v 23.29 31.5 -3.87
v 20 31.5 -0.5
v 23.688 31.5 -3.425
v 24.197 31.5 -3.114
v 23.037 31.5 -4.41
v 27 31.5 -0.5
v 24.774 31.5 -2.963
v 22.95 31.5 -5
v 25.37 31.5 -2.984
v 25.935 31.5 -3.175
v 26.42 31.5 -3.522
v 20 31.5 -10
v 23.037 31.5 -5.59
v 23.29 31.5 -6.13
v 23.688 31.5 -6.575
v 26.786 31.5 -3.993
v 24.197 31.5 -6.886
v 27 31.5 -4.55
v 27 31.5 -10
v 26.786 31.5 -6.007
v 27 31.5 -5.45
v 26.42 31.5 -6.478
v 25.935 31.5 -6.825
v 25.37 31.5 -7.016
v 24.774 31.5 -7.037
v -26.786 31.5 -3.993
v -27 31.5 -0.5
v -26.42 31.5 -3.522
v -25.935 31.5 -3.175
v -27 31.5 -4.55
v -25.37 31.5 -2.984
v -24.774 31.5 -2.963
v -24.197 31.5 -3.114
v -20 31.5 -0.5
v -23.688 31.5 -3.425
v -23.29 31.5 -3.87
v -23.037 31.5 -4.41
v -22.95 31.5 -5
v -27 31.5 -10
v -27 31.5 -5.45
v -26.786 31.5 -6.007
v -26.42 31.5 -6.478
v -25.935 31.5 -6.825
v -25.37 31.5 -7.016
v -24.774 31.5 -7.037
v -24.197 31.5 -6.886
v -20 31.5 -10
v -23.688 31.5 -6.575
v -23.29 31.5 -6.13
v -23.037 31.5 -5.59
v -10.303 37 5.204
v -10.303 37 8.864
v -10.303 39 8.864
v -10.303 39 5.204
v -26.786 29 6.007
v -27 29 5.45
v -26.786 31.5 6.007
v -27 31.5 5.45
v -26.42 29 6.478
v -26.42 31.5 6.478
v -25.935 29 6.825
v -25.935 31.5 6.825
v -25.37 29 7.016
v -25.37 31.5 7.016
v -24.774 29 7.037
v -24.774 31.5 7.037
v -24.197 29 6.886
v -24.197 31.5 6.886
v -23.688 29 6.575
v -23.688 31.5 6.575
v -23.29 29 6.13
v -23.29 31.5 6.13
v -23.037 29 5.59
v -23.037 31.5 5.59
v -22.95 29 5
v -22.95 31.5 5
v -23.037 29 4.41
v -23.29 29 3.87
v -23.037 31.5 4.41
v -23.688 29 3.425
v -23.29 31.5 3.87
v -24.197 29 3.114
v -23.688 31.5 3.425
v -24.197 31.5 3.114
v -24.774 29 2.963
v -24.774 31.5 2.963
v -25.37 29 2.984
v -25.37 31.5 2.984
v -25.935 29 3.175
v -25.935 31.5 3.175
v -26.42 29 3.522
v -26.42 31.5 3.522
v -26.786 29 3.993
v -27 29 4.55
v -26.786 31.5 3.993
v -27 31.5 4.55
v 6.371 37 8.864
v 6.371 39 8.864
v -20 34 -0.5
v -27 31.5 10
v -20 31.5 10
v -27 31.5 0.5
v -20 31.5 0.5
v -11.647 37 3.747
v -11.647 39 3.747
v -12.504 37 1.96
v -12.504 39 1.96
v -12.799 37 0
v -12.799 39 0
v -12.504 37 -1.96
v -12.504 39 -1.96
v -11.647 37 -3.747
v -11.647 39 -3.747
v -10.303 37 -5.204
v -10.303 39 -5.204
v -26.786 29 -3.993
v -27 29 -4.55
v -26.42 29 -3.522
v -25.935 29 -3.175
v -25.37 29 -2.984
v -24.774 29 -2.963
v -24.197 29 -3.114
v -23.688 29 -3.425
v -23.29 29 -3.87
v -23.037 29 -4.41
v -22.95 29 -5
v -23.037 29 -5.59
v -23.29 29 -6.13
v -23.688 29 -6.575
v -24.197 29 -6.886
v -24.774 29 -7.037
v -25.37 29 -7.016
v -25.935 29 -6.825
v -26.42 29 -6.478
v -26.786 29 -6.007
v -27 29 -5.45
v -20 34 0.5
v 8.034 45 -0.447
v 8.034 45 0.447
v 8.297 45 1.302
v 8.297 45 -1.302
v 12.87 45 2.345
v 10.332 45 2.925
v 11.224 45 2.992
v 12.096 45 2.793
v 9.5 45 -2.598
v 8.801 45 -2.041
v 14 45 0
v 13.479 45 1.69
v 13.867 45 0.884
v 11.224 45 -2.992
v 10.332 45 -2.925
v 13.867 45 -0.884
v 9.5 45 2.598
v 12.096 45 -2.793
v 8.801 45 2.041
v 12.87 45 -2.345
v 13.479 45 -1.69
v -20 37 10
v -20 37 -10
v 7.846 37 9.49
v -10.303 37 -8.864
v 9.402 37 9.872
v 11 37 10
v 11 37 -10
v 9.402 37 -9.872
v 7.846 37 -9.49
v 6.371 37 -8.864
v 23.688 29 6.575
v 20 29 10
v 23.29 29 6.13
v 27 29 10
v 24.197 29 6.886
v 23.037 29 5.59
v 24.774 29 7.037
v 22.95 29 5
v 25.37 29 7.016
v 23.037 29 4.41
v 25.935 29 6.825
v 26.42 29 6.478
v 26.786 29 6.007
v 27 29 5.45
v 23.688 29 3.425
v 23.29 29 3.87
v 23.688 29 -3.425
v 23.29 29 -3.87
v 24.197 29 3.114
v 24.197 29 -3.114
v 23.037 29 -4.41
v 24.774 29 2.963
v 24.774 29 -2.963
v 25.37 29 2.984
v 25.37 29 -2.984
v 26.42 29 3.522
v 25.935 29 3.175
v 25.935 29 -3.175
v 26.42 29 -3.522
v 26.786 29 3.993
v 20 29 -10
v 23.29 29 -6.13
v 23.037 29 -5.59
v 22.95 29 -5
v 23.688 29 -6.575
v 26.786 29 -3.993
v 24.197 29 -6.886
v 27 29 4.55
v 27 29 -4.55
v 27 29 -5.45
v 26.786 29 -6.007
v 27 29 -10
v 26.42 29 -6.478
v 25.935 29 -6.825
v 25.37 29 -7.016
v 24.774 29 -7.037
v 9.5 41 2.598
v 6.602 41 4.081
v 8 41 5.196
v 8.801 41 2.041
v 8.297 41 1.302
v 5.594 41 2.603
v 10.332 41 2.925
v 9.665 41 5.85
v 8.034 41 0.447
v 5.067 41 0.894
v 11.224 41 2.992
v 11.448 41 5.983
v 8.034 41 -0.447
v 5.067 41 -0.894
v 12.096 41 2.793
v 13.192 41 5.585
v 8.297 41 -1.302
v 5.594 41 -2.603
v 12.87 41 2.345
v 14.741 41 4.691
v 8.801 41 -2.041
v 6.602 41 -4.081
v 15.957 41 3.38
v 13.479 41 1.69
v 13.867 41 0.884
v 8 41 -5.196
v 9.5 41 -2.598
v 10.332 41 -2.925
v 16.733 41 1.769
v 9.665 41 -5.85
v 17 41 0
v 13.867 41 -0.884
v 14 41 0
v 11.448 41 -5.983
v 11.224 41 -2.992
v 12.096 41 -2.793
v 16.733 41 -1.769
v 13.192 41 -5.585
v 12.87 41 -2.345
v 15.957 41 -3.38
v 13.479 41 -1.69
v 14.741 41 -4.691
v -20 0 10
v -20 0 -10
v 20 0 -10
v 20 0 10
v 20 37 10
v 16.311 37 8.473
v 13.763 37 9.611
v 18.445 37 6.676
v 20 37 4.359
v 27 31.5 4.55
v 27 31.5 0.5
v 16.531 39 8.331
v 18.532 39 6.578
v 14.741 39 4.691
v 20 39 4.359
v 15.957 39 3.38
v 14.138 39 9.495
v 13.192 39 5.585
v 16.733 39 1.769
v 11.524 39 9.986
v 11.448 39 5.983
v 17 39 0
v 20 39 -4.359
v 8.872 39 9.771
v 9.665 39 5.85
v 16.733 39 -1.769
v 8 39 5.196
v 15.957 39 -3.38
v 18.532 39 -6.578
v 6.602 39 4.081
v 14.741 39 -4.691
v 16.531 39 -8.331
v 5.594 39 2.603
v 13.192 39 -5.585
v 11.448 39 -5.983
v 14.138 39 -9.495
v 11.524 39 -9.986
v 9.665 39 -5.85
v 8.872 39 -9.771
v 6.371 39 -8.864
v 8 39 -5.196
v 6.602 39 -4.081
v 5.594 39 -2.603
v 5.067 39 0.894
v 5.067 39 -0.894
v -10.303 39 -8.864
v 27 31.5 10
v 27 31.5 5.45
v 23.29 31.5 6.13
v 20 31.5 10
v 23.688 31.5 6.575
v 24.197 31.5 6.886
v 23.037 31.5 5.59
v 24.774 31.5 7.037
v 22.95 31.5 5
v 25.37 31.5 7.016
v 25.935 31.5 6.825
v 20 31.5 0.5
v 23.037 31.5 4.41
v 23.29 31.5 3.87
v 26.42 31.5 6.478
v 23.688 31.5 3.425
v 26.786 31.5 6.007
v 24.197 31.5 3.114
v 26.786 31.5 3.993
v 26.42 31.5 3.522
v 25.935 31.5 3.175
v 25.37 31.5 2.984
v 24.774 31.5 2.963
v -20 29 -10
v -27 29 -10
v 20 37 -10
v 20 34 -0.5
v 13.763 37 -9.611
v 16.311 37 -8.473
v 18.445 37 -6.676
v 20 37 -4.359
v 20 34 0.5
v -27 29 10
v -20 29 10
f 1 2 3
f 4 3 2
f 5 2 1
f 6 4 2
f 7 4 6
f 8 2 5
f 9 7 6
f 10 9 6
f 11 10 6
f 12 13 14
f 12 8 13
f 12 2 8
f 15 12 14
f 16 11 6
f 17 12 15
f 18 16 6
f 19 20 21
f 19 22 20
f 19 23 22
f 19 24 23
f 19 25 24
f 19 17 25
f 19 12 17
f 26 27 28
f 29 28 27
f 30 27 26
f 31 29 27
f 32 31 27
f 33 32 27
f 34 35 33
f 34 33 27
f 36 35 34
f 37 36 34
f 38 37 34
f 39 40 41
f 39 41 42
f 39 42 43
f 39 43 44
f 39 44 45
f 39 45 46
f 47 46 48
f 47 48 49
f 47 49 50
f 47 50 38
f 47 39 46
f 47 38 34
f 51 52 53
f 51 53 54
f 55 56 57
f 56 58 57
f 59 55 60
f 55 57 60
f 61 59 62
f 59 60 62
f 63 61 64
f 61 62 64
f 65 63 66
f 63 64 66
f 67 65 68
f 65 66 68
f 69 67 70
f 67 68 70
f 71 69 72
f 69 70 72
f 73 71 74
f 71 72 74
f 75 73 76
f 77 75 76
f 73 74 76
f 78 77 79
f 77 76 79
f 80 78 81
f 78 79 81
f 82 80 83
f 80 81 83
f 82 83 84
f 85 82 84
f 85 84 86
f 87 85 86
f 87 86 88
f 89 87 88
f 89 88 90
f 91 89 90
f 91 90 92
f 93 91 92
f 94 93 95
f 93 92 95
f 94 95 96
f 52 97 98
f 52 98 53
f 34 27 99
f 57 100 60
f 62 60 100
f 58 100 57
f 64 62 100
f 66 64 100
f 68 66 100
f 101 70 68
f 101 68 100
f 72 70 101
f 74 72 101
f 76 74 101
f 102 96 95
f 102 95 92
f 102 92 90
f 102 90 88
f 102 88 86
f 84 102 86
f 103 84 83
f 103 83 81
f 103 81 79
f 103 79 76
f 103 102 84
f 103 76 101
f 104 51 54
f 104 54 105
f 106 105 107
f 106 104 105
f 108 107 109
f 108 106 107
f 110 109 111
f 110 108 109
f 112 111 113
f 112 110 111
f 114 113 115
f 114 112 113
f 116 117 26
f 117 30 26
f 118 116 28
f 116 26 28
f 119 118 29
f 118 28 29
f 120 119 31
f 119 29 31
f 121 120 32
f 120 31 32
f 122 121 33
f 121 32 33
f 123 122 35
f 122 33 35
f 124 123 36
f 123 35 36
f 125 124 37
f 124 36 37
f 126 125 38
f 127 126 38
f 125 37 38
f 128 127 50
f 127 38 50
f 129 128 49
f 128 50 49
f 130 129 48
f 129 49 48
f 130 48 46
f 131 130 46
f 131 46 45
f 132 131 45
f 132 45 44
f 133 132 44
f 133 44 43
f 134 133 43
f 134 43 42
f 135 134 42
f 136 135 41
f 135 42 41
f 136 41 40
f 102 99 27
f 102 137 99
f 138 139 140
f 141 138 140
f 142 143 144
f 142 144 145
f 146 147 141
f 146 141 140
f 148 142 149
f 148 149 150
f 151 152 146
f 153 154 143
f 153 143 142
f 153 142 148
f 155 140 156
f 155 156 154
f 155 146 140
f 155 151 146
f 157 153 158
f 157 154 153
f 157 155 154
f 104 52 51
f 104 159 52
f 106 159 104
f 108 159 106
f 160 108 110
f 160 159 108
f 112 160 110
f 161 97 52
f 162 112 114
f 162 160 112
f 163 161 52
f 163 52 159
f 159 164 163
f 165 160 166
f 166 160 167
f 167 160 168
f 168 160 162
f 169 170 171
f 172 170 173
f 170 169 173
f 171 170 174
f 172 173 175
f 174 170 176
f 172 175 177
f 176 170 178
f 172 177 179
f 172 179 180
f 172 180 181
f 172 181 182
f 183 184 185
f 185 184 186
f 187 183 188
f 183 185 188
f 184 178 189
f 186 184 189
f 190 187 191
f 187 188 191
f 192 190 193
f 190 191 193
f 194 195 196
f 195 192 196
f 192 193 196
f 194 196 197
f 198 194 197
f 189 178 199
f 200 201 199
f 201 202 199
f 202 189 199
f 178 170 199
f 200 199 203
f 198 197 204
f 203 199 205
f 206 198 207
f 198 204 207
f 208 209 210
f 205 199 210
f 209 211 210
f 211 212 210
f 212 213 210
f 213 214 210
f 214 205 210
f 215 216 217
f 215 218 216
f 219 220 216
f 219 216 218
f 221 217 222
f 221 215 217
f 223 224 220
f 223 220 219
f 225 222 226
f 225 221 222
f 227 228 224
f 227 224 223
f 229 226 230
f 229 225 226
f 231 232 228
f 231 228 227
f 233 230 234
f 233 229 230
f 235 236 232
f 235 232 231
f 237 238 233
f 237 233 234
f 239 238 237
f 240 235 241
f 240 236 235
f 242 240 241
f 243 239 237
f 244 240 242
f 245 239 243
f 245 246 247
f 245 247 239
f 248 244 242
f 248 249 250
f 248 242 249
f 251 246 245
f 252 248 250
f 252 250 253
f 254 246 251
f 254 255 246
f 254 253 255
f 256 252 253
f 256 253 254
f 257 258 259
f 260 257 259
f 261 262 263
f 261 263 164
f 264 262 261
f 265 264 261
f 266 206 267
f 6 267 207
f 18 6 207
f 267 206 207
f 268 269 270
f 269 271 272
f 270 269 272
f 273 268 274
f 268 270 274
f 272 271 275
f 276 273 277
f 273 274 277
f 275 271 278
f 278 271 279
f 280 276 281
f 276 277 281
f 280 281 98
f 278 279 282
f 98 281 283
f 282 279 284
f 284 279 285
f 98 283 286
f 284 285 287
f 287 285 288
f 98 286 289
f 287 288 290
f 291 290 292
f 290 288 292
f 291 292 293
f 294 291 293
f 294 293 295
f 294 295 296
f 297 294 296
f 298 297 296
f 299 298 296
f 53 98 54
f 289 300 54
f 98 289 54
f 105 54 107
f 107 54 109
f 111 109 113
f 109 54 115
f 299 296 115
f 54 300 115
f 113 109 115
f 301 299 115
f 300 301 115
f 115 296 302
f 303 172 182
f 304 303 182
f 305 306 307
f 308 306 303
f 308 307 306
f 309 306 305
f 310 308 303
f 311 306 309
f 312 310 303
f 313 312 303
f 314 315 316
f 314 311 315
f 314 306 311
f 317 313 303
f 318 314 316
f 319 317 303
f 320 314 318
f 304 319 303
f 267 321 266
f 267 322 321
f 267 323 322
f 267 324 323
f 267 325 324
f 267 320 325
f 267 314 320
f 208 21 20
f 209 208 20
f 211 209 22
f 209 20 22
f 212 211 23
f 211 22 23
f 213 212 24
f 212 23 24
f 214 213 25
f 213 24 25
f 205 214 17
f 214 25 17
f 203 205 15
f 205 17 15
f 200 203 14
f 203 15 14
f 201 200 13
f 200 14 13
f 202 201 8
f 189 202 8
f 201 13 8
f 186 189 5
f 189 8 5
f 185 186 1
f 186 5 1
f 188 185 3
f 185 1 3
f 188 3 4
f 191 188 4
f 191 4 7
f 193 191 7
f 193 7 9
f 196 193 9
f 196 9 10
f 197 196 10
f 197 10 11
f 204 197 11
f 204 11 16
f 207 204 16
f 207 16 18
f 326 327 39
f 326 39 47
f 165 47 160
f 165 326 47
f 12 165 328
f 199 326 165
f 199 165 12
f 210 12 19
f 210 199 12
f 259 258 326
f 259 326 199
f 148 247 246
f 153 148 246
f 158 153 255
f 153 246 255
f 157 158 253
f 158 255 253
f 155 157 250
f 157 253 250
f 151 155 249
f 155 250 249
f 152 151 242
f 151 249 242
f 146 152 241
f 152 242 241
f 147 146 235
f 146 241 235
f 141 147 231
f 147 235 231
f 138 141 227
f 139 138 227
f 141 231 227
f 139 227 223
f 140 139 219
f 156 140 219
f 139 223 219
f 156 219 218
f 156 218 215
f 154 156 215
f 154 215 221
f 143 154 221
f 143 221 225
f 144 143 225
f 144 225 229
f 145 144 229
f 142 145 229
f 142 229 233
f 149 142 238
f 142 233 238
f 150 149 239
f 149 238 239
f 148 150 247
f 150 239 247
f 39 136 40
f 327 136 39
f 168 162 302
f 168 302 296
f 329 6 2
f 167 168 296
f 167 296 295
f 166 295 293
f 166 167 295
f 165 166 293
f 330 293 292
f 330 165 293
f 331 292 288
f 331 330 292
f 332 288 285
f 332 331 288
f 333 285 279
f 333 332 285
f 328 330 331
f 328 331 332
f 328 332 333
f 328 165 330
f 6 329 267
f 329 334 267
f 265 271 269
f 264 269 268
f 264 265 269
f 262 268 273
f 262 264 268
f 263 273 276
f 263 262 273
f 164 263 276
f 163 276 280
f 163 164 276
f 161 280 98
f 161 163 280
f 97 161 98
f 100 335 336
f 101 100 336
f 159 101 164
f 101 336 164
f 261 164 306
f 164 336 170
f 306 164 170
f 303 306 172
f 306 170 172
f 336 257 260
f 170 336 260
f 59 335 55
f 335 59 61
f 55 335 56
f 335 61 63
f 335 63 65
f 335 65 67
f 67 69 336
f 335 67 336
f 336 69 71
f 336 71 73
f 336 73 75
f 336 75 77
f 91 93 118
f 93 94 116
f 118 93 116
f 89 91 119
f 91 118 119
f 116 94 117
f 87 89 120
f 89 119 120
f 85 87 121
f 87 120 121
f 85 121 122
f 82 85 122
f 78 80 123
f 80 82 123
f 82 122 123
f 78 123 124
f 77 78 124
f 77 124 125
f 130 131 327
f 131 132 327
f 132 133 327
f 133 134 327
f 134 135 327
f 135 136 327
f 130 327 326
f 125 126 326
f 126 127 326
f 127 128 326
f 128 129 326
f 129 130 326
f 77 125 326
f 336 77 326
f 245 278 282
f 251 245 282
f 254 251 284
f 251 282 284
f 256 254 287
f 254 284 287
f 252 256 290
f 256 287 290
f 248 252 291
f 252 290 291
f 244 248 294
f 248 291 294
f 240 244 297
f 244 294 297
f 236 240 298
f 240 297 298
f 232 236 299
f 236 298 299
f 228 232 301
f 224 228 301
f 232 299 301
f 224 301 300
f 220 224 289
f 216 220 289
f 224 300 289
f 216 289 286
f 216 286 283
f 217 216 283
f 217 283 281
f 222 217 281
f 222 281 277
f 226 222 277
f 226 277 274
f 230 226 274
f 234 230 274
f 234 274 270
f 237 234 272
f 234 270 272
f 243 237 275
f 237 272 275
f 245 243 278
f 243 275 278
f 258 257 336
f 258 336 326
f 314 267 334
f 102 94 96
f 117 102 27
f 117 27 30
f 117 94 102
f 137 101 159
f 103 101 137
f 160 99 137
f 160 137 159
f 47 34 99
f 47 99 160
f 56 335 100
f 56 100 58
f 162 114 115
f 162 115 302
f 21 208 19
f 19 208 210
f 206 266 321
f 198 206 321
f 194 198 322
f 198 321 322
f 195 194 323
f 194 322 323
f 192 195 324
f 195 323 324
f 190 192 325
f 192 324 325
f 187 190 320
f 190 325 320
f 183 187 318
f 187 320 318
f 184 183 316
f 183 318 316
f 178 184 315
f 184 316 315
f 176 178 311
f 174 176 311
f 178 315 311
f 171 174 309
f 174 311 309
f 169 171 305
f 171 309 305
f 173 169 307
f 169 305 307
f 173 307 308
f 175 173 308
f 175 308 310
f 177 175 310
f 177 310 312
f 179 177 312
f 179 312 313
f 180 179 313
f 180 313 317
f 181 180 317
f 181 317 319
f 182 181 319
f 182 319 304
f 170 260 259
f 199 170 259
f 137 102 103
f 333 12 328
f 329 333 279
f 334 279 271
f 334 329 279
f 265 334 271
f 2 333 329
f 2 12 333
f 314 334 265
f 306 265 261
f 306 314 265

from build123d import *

# Parameters (mm, degrees)
SKETCH1_W                = 40
SKETCH1_H                = 20
BOSS_EXTRUDE1_DEPTH      = 29
SKETCH2_W                = 54
SKETCH2_H                = 20
BOSS_EXTRUDE2_DEPTH      = 2.5
SKETCH3_W                = 40
SKETCH3_H                = 20
BOSS_EXTRUDE3_DEPTH      = 5.5
BOSS_EXTRUDE4_DEPTH      = 2
SKETCH5_R                = 6
BOSS_EXTRUDE5_DEPTH      = 2
SKETCH6_R                = 3
BOSS_EXTRUDE6_DEPTH      = 4
SKETCH7_R                = 2.05
CUT_EXTRUDE2_DEPTH       = 4
BOSS_EXTRUDE8_DEPTH      = 0.5
BOSS_EXTRUDE8_DEPTH_BACK = 0.5


with BuildPart() as part:
    # Sketch1 → Boss-Extrude1 (new body)
    with BuildSketch(Plane(origin=(0, 0, 0), x_dir=(1, 0, 0), z_dir=(0, 1, 0))):
        Rectangle(SKETCH1_W, SKETCH1_H)
    extrude(amount=BOSS_EXTRUDE1_DEPTH)

    # Sketch2 → Boss-Extrude2 (add)
    with BuildSketch(Plane(origin=(0, 29, 0), x_dir=(1, 0, 0), z_dir=(0, 1, 0))):
        Rectangle(SKETCH2_W, SKETCH2_H)
    extrude(amount=BOSS_EXTRUDE2_DEPTH)

    # Sketch3 → Boss-Extrude3 (add)
    with BuildSketch(Plane(origin=(0, 31.5, 0), x_dir=(1, 0, 0), z_dir=(0, 1, 0))):
        Rectangle(SKETCH3_W, SKETCH3_H)
    extrude(amount=BOSS_EXTRUDE3_DEPTH)

    # Sketch4 → Boss-Extrude4 (add)
    with BuildSketch(Plane(origin=(0, 37, 0), x_dir=(1, 0, 0), z_dir=(0, 1, 0))):
        with BuildLine():
            Line((-10.302888497, 5.203858548), (-10.302888497, 8.863863335))
            Line((-10.302888497, 8.863863335), (6.370537096, 8.863863335))
            ThreePointArc((6.370537096, 8.863863335), (14.138323544, 9.494784112), (20, 4.358898944))
            Line((20, 4.358898944), (20, -4.358898944))
            ThreePointArc((20, -4.358898944), (14.138323544, -9.494784112), (6.370537096, -8.863863335))
            Line((6.370537096, -8.863863335), (-10.302888497, -8.863863335))
            Line((-10.302888497, -8.863863335), (-10.302888497, -5.203858548))
            ThreePointArc((-10.302888497, -5.203858548), (-12.798836729, 0), (-10.302888497, 5.203858548))
        make_face()
    extrude(amount=BOSS_EXTRUDE4_DEPTH)

    # Sketch5 → Boss-Extrude5 (add)
    with BuildSketch(Plane(origin=(0, 39, 0), x_dir=(1, 0, 0), z_dir=(0, 1, 0))):
        with Locations((11, 0)):
            Circle(SKETCH5_R)
    extrude(amount=BOSS_EXTRUDE5_DEPTH)

    # Sketch6 → Boss-Extrude6 (add)
    with BuildSketch(Plane(origin=(0, 41, 0), x_dir=(1, 0, 0), z_dir=(0, 1, 0))):
        with Locations((11, 0)):
            Circle(SKETCH6_R)
    extrude(amount=BOSS_EXTRUDE6_DEPTH)

    # Sketch7 → Cut-Extrude2 (cut)
    with BuildSketch(Plane(origin=(0, 31.5, 0), x_dir=(1, 0, 0), z_dir=(0, 1, 0))):
        with Locations((-25, 5)):
            Circle(SKETCH7_R)
        with Locations((-25, -5)):
            Circle(SKETCH7_R)
        with Locations((25, 5)):
            Circle(SKETCH7_R)
        with Locations((25, -5)):
            Circle(SKETCH7_R)
    extrude(amount=-CUT_EXTRUDE2_DEPTH, mode=Mode.SUBTRACT)

    # Sketch8 → Boss-Extrude8 (add, two sides)
    with BuildSketch(Plane.XY) as boss_extrude8_sk:
        Polygon((-20, 34), (-27, 31.5), (-20, 31.5), align=None)
        Polygon((20, 31.5), (20, 34), (27, 31.5), align=None)
    extrude(amount=BOSS_EXTRUDE8_DEPTH)
    extrude(boss_extrude8_sk.sketch, amount=-BOSS_EXTRUDE8_DEPTH_BACK)


solid = part.part
